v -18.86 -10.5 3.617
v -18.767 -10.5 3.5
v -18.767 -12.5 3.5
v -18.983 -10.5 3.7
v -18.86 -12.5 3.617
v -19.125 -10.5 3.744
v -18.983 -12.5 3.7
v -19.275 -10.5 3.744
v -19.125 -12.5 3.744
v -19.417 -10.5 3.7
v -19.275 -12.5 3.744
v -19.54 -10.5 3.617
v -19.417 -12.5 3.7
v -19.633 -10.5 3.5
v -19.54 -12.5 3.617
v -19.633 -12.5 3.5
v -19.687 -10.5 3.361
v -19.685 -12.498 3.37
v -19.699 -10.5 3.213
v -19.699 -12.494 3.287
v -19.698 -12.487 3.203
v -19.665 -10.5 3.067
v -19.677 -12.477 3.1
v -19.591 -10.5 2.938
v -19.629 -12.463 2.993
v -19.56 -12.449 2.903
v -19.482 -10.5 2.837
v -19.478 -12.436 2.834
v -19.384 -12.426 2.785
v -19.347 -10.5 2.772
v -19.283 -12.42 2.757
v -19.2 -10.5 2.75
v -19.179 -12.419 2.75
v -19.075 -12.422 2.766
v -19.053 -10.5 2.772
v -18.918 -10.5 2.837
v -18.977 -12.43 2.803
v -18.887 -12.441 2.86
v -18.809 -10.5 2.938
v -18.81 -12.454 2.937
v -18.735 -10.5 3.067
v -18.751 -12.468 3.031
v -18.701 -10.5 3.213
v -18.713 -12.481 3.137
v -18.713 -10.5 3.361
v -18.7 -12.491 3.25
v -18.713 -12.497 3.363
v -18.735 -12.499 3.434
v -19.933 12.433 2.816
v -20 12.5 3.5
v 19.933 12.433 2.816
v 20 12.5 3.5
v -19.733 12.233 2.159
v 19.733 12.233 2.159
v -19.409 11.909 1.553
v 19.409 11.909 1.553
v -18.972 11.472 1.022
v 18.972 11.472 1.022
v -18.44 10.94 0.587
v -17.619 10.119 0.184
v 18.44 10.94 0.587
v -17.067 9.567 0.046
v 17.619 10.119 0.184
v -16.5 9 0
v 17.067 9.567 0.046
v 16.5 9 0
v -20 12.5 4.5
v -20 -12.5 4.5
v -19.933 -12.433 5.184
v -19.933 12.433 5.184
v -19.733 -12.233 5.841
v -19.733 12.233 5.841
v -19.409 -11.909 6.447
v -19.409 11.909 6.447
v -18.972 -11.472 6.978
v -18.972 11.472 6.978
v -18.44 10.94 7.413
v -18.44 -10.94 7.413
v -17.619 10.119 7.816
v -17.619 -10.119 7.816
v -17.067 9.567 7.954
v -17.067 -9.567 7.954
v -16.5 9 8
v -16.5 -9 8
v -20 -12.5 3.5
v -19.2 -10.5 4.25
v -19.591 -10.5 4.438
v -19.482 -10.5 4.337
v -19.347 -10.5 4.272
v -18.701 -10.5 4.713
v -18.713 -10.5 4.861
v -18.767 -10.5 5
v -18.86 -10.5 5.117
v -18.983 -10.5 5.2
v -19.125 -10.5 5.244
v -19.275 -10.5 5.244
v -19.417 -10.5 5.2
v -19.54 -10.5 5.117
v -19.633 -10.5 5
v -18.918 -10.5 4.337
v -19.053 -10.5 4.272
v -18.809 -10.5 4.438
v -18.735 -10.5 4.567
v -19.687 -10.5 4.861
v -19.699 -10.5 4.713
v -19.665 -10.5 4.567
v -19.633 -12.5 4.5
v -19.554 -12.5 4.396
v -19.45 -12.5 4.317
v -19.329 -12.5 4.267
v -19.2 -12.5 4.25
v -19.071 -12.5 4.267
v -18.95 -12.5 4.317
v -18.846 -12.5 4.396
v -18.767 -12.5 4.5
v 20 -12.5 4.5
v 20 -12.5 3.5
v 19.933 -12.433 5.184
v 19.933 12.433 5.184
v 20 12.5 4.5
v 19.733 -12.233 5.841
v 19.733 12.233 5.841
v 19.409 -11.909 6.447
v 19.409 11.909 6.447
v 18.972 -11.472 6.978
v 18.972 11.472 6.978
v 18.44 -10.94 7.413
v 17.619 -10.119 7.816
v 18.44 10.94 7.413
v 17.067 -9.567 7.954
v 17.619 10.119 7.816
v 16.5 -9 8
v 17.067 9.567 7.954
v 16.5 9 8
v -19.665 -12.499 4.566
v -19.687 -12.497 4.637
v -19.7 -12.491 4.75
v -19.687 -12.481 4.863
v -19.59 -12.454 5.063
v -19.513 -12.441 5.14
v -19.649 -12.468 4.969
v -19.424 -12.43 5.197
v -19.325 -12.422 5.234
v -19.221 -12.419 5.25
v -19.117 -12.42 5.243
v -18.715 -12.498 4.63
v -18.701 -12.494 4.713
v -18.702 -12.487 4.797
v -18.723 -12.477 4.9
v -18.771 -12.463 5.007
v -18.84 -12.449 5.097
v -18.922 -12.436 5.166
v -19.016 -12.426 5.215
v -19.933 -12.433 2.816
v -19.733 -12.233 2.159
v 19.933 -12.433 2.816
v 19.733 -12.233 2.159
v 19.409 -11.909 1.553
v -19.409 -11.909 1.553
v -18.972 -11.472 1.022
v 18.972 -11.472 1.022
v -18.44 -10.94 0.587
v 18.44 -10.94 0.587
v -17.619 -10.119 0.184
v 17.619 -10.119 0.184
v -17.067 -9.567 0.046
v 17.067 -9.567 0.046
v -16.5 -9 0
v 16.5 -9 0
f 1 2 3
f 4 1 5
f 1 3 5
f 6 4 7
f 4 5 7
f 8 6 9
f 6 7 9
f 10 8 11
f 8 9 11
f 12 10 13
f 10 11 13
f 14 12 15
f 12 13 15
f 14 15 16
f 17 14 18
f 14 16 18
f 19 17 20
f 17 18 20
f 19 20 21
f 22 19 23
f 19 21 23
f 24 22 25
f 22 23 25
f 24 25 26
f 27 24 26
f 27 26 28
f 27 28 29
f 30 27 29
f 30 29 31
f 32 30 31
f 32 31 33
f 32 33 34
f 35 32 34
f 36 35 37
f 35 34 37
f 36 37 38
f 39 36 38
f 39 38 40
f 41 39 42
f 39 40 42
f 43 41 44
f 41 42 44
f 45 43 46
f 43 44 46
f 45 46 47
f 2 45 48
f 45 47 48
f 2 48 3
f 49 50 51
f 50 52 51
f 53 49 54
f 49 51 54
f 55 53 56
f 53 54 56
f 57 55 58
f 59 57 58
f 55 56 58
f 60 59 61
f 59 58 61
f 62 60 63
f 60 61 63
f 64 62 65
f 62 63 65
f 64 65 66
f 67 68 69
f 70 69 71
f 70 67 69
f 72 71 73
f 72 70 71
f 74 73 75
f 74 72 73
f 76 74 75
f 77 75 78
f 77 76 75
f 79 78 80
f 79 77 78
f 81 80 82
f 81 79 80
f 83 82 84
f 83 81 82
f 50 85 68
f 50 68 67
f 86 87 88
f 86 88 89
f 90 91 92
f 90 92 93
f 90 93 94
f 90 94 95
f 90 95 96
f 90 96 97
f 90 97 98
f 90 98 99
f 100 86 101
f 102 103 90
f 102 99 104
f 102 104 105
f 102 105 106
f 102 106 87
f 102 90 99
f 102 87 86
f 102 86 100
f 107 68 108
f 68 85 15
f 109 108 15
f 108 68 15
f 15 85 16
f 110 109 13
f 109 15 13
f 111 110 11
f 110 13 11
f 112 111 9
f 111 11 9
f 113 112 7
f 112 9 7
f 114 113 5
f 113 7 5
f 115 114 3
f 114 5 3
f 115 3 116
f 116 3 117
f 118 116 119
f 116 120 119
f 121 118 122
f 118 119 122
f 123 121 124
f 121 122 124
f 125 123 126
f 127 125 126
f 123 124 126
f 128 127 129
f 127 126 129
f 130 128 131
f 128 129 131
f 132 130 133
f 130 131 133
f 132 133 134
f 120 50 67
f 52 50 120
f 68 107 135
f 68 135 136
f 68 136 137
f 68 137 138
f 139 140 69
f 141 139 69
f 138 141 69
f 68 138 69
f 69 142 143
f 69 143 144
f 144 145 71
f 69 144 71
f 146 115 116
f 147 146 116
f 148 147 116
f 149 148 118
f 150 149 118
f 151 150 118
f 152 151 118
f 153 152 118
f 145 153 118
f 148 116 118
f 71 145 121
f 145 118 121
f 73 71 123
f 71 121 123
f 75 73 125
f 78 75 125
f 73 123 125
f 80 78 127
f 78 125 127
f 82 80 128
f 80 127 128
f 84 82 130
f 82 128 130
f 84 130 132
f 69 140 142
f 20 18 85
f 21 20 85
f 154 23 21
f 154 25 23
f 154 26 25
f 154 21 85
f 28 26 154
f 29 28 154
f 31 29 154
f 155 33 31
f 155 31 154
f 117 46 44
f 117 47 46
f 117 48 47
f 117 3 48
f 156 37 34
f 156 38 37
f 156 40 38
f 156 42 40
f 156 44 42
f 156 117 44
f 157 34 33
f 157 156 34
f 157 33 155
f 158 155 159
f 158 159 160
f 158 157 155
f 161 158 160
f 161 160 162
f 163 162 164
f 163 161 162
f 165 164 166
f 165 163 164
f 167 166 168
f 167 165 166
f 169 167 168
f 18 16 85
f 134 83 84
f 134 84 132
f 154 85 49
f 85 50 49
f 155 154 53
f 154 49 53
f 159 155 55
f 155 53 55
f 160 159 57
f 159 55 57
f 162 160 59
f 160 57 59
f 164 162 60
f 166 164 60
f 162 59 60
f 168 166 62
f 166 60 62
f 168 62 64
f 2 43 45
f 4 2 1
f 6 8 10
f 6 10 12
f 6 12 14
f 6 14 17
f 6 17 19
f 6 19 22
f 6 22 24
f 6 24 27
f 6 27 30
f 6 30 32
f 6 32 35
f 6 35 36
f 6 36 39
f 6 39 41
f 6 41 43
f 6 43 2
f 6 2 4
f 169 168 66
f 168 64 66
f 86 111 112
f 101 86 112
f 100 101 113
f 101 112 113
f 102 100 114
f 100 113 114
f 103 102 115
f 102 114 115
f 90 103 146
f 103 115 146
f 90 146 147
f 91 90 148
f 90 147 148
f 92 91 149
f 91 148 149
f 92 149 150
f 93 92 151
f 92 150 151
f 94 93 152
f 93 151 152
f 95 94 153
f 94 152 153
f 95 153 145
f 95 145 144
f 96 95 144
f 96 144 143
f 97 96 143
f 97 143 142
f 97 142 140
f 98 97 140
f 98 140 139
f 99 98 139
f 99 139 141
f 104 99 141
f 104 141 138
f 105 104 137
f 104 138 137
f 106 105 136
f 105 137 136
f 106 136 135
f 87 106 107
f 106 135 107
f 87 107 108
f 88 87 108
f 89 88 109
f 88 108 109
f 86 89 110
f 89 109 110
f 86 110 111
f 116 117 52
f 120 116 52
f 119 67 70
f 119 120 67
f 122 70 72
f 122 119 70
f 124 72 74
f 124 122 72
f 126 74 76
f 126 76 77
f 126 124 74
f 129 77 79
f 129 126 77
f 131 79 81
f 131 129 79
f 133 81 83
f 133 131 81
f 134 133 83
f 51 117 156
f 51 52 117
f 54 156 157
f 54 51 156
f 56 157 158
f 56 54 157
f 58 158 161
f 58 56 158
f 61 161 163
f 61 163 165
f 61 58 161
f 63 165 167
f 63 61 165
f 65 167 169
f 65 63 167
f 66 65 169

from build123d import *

# Parameters (mm, degrees)
ESBO_O1_W                = 40
ESBO_O1_H                = 25
RESSALTO_EXTRUS_O1_DEPTH = 8
FILETE1_R                = 3.5
ESBO_O2_R                = 0.5
CORTE_EXTRUS_O1_DEPTH    = 2


with BuildPart() as part:
    # Esboço1 → Ressalto-extrusão1 (new body)
    with BuildSketch(Plane.XY):
        Rectangle(ESBO_O1_W, ESBO_O1_H)
    extrude(amount=RESSALTO_EXTRUS_O1_DEPTH)

    # Filete1
    filete1_edges = [part.edges().sort_by_distance(p)[0] for p in [
        (-20, 0, 8),
        (0, -12.5, 8),
        (20, 0, 8),
        (0, -12.5, 0),
        (-20, 0, 0),
        (0, 12.5, 0),
        (20, 0, 0),
        (0, 12.5, 8),
    ]]
    fillet(filete1_edges, radius=FILETE1_R)

    # Esboço2 → Corte-extrusão1 (cut)
    with BuildSketch(Plane.XZ.offset(12.5)):
        with Locations(Location((-19.2, 4.75, 0), (0, 0, 270))):
            Circle(ESBO_O2_R)
        with Locations(Location((-19.2, 3.25, 0), (0, 0, 30))):
            Circle(ESBO_O2_R)
    extrude(amount=-CORTE_EXTRUS_O1_DEPTH, mode=Mode.SUBTRACT)


solid = part.part
